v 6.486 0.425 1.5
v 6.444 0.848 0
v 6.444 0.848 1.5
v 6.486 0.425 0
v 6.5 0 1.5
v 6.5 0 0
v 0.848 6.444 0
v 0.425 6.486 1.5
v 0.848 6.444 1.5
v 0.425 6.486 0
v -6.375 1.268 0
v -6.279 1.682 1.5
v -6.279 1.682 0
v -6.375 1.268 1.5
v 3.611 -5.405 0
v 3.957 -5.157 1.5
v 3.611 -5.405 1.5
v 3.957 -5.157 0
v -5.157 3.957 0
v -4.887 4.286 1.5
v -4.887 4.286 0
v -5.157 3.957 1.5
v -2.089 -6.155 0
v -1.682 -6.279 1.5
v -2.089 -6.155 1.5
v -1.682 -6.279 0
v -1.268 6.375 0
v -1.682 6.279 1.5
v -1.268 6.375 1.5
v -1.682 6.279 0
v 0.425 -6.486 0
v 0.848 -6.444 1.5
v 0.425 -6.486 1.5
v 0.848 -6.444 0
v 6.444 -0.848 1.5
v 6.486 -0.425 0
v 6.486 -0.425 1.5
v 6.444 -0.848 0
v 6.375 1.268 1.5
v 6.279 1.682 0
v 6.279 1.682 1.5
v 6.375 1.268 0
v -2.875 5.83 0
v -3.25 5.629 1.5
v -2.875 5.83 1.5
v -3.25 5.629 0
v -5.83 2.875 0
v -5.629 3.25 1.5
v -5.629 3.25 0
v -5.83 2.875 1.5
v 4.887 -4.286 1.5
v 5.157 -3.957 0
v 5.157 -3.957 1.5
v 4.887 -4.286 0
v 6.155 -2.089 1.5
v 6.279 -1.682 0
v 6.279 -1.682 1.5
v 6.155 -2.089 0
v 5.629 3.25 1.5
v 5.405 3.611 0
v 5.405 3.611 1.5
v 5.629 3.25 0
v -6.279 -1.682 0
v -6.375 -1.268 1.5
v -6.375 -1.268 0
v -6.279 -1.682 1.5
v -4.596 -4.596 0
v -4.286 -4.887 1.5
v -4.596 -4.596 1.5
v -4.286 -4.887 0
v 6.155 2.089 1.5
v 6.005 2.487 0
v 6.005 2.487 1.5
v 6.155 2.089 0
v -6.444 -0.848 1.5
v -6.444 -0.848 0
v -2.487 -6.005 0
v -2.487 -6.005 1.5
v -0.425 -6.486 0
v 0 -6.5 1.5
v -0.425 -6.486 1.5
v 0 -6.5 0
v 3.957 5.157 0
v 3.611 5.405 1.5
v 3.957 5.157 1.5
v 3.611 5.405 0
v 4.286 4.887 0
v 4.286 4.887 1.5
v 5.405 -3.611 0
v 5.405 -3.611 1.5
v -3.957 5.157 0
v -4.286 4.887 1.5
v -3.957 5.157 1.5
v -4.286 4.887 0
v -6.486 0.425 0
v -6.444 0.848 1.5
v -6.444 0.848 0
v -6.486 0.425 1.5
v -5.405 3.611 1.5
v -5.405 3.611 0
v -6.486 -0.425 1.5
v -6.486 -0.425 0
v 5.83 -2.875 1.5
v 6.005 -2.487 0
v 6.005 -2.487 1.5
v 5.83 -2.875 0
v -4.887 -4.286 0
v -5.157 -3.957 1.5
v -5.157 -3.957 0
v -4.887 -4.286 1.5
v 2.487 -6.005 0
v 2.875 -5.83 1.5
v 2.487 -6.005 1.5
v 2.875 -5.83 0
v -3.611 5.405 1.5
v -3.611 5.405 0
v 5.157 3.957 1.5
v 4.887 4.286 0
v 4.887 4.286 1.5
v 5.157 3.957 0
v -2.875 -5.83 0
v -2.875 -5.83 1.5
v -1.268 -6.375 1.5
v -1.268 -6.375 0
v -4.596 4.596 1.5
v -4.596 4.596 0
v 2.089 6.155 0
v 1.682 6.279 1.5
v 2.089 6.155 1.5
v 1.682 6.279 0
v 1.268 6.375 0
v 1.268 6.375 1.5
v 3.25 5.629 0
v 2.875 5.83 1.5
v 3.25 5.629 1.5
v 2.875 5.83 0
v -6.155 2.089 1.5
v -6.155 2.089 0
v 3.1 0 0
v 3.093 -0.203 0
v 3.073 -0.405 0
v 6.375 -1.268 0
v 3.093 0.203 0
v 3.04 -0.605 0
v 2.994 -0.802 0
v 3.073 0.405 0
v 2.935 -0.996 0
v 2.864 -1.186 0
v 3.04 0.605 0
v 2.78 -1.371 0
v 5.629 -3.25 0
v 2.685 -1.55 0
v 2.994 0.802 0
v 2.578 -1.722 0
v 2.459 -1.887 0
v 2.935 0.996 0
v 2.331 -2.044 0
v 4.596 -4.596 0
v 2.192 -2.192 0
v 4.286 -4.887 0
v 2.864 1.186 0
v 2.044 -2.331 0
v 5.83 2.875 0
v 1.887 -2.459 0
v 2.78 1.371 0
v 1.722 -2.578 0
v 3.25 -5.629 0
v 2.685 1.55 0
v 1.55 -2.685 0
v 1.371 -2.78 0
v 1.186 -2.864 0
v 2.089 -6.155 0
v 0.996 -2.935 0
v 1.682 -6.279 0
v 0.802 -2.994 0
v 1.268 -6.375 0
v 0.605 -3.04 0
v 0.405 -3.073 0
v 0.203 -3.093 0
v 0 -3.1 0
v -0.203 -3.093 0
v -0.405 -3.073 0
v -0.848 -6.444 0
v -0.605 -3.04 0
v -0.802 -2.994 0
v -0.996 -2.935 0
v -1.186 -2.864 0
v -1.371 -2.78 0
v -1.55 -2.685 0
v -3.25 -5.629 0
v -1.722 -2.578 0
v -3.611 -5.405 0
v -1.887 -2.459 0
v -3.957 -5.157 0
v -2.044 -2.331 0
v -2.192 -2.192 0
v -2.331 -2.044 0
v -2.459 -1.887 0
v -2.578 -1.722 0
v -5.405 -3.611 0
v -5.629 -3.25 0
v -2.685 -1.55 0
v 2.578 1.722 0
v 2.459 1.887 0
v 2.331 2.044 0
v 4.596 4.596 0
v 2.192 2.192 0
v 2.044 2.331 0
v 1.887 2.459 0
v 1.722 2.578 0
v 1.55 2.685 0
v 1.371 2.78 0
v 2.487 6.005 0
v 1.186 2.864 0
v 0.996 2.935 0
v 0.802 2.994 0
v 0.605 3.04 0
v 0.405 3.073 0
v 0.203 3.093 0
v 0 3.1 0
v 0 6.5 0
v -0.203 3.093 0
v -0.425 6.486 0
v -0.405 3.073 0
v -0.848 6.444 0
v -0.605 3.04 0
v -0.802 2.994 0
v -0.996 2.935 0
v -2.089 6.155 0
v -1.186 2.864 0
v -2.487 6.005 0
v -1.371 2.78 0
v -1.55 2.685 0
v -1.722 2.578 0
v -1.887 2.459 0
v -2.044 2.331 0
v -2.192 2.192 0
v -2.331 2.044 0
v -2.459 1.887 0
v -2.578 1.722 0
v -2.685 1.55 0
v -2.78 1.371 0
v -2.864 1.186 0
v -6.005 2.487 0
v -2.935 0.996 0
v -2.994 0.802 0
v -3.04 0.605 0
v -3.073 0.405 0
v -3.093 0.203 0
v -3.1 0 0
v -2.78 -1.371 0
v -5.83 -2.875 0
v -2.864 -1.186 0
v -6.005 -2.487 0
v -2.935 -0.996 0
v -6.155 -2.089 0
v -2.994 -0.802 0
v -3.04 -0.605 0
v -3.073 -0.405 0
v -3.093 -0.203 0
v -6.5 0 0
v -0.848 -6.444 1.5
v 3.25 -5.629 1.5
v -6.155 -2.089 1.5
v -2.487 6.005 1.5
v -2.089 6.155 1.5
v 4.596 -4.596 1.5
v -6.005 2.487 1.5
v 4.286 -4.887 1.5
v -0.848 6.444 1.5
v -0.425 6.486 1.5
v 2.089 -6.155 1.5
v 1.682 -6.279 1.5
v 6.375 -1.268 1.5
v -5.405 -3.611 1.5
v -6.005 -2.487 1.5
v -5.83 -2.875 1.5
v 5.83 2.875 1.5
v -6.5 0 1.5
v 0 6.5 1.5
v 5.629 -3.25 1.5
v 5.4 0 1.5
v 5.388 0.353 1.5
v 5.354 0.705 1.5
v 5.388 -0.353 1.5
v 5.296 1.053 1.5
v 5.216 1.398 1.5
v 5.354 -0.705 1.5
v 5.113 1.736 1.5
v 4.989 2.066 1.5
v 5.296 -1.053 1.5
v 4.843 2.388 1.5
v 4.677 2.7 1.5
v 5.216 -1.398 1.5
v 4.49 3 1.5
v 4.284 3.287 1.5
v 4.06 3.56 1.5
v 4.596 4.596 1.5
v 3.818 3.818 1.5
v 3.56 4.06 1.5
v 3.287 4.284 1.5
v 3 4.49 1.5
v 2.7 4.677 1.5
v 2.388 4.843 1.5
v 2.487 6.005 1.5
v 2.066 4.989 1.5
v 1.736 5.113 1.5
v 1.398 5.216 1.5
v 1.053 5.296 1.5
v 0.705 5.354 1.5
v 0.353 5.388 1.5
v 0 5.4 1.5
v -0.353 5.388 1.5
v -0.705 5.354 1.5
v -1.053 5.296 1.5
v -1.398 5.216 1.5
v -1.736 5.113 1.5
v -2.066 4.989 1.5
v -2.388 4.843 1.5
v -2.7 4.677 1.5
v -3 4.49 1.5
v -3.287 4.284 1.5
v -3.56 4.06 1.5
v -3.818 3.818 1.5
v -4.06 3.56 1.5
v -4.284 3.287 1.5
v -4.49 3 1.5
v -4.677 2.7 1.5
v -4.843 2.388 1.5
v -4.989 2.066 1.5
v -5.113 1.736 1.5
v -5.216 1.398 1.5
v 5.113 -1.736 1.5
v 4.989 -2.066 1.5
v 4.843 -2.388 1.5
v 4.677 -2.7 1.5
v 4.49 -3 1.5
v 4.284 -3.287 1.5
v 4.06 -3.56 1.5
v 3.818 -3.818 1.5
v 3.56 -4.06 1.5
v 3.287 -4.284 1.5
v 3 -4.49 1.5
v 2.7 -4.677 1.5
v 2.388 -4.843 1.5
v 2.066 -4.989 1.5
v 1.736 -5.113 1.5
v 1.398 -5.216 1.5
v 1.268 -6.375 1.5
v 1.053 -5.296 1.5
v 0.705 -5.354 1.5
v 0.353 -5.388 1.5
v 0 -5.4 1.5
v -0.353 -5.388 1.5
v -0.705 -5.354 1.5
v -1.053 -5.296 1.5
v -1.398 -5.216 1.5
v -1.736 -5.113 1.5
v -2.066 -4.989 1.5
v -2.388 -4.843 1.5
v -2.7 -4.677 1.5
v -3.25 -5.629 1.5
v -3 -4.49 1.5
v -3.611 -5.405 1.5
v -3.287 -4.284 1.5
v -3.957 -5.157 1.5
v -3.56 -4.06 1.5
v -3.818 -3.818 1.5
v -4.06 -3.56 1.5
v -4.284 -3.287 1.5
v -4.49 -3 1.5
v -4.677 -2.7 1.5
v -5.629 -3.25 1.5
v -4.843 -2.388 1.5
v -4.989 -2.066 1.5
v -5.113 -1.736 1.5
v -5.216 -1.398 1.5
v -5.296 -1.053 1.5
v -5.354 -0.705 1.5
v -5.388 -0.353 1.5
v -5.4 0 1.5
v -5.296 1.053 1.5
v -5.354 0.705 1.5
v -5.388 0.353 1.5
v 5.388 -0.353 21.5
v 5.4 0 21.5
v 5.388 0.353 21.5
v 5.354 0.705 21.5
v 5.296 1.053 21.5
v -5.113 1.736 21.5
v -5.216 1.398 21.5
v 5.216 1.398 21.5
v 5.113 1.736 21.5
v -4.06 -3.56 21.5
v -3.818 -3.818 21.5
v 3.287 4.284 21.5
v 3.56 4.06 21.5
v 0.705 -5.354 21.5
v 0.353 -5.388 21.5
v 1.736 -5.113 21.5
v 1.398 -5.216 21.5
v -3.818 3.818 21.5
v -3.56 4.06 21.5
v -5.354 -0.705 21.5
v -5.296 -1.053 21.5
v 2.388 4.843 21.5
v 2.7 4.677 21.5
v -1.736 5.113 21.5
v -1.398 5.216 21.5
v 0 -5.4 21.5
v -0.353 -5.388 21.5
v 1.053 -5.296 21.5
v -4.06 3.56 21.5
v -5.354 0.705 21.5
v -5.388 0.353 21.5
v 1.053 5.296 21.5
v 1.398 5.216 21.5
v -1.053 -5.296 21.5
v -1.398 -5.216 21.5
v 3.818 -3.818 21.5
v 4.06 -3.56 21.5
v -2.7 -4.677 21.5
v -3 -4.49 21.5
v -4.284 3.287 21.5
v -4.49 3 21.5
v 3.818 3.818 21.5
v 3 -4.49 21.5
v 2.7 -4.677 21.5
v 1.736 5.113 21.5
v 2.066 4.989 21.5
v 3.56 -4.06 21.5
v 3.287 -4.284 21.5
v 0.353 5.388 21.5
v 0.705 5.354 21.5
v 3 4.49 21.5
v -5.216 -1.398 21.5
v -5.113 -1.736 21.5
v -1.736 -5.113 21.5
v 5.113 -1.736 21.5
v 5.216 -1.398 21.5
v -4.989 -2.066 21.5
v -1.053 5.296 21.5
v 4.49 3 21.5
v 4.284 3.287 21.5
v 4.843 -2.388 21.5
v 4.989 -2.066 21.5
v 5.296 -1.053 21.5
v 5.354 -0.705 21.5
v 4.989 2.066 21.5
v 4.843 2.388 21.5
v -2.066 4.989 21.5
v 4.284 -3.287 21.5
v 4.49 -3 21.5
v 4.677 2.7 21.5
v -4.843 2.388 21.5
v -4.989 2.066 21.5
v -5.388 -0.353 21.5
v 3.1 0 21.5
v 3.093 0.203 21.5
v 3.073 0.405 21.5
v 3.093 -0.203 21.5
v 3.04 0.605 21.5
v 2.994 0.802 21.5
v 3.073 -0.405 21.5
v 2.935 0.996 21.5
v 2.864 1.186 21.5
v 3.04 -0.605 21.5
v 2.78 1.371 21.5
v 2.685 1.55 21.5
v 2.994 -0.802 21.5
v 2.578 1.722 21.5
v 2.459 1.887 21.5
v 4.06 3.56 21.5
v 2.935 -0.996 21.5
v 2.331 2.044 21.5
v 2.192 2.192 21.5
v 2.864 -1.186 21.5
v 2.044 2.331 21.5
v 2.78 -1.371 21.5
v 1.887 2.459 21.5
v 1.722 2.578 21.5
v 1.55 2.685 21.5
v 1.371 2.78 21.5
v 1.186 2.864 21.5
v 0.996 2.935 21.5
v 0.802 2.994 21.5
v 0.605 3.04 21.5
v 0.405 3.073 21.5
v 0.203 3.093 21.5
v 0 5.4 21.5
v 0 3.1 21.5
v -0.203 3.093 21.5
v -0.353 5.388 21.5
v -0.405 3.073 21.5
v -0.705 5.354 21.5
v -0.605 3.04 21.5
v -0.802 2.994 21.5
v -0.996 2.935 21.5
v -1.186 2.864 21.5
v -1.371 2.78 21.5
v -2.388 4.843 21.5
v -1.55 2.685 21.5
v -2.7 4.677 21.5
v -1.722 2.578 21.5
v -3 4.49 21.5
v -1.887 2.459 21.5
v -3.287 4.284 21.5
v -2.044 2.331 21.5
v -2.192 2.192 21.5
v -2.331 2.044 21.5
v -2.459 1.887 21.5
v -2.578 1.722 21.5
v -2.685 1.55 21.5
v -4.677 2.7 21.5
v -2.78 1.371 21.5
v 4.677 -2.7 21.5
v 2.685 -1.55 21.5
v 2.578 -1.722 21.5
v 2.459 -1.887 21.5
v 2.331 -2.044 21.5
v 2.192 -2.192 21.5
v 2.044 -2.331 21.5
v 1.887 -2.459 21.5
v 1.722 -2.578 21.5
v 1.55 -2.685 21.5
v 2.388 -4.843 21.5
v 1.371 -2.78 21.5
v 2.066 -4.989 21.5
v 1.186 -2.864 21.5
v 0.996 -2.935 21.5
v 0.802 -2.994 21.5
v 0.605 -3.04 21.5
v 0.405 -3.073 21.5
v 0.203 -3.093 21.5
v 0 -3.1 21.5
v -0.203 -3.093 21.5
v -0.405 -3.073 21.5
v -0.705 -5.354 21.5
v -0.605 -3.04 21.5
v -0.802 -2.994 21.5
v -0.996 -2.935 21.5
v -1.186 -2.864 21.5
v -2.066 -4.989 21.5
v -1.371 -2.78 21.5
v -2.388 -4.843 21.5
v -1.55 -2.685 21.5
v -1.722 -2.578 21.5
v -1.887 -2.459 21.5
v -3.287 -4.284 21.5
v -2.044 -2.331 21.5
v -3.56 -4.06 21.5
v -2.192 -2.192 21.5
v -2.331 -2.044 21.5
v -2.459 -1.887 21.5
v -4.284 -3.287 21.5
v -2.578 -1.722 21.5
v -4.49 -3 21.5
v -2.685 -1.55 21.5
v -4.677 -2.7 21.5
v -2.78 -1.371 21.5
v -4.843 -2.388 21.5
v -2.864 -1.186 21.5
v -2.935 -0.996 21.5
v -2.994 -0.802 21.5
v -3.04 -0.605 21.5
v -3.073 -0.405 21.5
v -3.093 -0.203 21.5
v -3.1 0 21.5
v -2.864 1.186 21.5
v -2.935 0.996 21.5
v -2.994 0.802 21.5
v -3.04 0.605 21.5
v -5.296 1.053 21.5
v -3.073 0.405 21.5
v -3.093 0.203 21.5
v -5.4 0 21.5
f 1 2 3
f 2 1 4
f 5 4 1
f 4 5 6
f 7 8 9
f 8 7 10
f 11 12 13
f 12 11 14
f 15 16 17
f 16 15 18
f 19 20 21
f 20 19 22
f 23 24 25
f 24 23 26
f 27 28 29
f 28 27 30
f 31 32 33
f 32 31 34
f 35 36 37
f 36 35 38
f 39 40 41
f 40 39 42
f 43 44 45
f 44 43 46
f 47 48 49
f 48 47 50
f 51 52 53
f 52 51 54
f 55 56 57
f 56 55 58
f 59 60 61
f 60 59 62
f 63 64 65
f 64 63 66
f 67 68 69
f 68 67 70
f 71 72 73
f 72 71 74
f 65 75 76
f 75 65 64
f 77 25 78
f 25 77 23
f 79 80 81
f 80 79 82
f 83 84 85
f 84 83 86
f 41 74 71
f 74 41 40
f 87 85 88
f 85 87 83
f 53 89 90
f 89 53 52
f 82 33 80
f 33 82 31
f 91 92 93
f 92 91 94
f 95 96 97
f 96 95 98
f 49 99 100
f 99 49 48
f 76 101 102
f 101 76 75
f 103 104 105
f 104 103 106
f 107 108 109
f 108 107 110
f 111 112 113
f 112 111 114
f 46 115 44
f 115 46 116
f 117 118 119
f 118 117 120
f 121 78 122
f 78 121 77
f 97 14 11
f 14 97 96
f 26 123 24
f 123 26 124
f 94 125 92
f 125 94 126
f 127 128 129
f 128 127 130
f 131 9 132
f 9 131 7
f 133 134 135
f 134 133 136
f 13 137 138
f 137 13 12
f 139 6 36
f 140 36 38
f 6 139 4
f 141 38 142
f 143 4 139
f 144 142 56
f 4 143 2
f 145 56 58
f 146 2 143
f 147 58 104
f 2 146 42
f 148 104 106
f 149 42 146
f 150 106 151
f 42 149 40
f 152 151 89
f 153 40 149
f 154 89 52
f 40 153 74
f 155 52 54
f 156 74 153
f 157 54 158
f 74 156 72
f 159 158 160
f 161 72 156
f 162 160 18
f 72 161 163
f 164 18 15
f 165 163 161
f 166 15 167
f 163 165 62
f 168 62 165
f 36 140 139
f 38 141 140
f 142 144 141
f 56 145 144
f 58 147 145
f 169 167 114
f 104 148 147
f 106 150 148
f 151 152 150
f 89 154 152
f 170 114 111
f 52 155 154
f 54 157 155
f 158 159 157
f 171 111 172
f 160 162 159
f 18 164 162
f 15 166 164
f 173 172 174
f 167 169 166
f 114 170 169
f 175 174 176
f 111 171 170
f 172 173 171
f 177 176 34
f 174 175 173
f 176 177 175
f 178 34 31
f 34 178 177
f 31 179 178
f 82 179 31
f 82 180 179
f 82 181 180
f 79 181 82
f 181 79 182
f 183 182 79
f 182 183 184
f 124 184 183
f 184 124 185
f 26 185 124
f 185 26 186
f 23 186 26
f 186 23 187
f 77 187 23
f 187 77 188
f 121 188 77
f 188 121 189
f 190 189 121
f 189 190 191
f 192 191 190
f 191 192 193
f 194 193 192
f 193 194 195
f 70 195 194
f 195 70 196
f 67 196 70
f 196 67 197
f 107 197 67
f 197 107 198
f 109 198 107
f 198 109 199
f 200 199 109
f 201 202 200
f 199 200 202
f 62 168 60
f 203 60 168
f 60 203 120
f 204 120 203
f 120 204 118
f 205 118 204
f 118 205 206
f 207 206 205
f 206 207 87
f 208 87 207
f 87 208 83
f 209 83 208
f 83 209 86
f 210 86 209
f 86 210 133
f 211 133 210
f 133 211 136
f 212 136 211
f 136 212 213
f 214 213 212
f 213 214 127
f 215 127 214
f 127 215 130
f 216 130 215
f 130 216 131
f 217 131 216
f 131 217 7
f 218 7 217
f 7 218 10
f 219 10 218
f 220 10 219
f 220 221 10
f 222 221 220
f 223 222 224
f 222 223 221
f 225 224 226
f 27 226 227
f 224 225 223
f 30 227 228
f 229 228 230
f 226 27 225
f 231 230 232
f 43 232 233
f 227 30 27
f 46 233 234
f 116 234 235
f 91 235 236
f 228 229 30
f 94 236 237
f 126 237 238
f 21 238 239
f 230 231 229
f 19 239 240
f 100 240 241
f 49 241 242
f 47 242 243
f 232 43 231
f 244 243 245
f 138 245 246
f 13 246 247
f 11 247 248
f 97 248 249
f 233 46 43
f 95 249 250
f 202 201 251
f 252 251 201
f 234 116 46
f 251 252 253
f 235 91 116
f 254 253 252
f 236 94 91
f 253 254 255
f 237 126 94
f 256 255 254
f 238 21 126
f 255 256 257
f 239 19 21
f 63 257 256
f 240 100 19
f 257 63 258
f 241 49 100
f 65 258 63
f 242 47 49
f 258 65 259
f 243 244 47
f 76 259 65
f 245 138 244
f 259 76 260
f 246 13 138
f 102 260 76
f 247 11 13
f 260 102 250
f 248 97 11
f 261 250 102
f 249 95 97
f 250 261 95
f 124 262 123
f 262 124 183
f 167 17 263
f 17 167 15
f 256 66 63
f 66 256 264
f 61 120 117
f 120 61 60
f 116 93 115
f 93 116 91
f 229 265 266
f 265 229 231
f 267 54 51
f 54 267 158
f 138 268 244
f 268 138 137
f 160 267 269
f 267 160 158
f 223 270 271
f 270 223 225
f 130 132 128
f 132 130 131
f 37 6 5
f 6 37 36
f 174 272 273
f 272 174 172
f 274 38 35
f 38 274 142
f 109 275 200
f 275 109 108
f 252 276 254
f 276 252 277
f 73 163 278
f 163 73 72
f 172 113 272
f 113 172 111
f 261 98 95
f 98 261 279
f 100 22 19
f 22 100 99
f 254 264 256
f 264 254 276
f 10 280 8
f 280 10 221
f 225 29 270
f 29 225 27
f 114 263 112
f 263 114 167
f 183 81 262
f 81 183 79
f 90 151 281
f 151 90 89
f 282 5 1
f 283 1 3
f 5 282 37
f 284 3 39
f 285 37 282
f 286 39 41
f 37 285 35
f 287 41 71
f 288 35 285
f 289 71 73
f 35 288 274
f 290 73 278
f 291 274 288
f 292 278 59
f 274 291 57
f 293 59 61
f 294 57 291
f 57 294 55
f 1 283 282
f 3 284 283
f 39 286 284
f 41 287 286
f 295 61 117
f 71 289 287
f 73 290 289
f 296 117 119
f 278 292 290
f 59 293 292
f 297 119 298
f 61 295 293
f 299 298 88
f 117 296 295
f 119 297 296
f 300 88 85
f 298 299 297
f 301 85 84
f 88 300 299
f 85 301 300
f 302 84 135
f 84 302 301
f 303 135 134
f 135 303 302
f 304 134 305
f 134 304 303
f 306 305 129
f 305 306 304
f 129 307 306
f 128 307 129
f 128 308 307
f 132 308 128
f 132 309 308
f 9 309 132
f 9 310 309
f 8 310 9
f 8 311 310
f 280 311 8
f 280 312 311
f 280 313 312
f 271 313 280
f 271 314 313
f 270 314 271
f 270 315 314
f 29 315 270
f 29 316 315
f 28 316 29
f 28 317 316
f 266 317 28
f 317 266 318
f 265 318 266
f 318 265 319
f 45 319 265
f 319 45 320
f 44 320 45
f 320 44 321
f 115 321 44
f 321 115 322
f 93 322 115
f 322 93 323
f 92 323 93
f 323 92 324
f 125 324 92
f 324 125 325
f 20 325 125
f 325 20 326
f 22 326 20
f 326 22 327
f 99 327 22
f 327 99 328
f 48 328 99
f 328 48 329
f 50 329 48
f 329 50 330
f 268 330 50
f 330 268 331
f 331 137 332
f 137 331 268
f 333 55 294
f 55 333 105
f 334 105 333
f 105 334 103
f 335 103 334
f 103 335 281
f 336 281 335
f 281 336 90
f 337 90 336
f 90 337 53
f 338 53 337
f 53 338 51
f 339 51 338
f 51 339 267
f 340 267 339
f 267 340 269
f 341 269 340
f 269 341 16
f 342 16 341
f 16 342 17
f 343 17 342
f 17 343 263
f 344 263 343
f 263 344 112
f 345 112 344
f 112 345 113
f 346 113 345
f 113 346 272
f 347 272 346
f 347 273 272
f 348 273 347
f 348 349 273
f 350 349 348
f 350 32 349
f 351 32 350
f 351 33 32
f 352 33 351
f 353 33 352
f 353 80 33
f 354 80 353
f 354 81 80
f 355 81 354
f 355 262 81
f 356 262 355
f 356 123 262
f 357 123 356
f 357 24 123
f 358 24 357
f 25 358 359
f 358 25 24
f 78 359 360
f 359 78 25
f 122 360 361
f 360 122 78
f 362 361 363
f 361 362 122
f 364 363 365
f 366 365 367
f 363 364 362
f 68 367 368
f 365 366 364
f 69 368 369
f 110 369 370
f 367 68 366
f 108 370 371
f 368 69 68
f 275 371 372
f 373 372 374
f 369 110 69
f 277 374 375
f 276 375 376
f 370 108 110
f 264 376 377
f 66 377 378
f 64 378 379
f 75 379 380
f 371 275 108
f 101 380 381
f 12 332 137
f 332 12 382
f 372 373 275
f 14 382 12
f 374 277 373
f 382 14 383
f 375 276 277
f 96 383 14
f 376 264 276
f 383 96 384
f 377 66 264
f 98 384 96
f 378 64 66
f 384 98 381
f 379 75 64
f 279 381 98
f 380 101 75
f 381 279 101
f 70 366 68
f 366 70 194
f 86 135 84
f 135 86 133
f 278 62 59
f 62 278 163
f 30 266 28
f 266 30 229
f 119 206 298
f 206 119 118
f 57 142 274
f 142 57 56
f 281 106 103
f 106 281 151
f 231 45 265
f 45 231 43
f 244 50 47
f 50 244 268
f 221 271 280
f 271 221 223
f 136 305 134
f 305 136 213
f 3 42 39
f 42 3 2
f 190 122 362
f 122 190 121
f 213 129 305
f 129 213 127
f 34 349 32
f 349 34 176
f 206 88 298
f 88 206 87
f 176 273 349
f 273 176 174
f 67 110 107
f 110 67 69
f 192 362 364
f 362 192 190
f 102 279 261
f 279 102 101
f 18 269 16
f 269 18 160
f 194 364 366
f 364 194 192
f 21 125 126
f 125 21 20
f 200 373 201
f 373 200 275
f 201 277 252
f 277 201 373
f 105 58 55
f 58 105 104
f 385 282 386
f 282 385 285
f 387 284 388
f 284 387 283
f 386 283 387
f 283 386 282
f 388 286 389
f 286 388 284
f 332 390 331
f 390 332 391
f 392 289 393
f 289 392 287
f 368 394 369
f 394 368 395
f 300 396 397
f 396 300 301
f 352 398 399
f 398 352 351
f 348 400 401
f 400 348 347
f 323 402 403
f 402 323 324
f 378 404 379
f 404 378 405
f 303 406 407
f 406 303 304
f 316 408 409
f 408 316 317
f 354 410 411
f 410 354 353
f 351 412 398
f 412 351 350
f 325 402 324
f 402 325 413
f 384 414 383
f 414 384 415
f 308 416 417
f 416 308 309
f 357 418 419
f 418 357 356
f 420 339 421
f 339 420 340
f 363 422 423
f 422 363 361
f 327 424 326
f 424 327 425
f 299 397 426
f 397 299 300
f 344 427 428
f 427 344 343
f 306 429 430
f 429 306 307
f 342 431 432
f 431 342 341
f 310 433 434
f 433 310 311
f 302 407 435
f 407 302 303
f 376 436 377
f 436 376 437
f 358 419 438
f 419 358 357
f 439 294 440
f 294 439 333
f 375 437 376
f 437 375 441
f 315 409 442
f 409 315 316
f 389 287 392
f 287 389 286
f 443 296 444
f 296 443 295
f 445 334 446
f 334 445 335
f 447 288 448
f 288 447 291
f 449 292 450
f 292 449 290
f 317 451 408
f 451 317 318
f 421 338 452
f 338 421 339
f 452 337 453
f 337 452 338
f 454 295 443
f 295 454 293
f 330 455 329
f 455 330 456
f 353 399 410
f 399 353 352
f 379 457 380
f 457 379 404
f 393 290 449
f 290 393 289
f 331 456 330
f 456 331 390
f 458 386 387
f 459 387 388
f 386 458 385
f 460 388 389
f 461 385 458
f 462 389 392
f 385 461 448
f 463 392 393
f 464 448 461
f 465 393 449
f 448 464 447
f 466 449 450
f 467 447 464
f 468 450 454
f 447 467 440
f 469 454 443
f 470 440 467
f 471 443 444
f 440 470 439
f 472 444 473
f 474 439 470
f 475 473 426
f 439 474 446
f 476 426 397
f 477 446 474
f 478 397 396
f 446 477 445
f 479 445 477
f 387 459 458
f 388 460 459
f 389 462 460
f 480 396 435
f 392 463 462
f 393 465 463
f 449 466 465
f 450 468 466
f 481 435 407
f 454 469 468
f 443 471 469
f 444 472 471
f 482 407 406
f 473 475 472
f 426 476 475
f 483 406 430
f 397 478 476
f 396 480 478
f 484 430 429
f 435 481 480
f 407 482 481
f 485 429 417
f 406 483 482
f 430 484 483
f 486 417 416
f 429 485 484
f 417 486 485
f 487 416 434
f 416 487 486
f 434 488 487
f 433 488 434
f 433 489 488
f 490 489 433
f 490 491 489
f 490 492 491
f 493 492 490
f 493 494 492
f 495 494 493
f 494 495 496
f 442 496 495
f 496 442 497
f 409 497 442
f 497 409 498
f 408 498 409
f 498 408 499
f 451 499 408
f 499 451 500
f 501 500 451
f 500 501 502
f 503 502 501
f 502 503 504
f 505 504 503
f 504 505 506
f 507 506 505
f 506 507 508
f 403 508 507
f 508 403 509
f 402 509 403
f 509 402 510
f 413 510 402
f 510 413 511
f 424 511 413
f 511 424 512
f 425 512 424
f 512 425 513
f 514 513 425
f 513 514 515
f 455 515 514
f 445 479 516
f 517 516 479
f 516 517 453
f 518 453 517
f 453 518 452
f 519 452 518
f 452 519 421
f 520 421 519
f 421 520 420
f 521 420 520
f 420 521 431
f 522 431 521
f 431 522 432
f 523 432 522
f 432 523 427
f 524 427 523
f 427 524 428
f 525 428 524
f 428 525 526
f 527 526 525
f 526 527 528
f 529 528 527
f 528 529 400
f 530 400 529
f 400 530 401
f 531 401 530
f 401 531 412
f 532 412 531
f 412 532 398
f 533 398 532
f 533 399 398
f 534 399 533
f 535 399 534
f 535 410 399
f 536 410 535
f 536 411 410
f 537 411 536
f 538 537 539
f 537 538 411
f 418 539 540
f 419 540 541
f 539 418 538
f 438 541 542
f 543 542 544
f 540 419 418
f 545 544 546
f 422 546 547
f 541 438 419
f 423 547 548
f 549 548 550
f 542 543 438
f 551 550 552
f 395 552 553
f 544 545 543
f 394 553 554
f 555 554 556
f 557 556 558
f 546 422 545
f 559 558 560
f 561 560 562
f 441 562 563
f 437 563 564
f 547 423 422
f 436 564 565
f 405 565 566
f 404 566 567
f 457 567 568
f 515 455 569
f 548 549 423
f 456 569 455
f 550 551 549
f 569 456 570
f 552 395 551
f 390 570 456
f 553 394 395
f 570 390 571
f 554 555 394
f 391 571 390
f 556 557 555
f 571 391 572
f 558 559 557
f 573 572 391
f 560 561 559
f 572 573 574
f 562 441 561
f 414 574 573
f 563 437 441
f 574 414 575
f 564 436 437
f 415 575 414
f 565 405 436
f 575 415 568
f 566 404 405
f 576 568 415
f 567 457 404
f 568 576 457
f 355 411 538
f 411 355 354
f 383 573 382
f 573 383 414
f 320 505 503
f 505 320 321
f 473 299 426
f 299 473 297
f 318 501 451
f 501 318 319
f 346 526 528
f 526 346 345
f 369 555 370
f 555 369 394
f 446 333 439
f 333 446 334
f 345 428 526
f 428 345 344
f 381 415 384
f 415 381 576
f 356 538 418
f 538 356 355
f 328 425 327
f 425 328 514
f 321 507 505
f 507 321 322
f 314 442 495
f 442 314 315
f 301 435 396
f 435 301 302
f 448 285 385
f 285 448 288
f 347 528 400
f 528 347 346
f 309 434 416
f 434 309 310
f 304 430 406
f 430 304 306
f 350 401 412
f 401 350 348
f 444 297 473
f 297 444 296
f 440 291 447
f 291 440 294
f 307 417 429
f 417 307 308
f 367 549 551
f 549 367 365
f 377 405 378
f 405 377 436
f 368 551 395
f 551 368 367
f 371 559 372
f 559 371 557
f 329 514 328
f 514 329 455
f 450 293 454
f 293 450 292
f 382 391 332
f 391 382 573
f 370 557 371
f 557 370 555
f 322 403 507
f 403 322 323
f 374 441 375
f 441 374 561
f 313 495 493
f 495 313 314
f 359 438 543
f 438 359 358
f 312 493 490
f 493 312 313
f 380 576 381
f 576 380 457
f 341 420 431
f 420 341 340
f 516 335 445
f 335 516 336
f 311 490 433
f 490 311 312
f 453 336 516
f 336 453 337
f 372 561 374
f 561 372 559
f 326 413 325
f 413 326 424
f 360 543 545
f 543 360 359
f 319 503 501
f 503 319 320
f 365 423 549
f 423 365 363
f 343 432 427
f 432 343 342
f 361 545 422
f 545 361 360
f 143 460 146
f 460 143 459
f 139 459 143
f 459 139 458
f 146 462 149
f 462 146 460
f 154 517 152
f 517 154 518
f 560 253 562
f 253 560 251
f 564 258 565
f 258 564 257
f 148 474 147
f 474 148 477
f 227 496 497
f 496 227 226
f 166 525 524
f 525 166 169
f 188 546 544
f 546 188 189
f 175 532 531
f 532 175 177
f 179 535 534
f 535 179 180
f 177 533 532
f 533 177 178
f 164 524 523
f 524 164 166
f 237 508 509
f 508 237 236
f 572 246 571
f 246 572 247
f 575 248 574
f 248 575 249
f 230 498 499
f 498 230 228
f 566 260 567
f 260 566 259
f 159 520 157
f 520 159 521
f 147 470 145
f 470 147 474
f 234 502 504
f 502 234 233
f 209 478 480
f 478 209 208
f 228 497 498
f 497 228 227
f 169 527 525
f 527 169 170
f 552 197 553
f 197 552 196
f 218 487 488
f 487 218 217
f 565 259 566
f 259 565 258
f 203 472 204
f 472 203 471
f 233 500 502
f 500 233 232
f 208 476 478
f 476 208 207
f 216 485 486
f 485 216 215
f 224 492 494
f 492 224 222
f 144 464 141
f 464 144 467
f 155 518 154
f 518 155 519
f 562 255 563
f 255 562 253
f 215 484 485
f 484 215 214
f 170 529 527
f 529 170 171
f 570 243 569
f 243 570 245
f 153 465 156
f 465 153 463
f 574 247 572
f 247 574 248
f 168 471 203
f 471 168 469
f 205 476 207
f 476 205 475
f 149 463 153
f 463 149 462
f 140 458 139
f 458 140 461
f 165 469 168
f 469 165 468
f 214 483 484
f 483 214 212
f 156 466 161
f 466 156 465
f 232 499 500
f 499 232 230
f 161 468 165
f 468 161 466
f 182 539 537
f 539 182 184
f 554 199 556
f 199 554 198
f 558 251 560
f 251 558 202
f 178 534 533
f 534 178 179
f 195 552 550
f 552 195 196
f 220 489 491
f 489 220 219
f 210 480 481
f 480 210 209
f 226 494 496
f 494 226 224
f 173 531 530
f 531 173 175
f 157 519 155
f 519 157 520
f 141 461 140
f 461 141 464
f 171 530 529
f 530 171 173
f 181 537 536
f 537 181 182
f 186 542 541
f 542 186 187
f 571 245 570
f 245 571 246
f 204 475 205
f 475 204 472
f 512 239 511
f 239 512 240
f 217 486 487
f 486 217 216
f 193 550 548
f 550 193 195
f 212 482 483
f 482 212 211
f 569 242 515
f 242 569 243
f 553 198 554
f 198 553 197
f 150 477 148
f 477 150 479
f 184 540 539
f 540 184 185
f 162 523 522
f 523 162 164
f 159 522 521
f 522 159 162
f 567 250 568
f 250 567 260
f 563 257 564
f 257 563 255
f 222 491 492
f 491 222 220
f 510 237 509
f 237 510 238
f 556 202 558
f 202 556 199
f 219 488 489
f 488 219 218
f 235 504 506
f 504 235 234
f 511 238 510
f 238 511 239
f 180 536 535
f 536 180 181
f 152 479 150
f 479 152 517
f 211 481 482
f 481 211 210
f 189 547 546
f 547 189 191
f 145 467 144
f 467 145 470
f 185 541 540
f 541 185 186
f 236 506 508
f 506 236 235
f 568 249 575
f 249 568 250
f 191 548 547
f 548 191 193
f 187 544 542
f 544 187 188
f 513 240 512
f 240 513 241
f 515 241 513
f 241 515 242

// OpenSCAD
// Adapter sleeve: lets a 0.2 mL PCR tube sit in a rack hole made for 1.5 mL tubes
// Print orientation: upside down, collar on the bed (z = 0), sleeve rising to z = 21.5

$fn = 96;

// ---- Dimensions (mm) ----
collar_d      = 13;    // collar outer diameter
collar_h      = 1.5;   // collar thickness (z = 0 to 1.5)
sleeve_od     = 10.8;  // sleeve body outer diameter
total_h       = 21.5;  // overall height (top of sleeve)
bore_d        = 6.2;   // straight through-bore diameter
eps           = 0.5;   // cutter overshoot past faces

difference() {
    union() {
        // Collar lying on the bed
        cylinder(d = collar_d, h = collar_h);
        // Sleeve body rising from the collar (overlaps collar slightly for a clean union)
        translate([0, 0, collar_h - 0.01])
            cylinder(d = sleeve_od, h = total_h - collar_h + 0.01);
    }
    // Straight bore through the full height, open at both ends
    translate([0, 0, -eps])
        cylinder(d = bore_d, h = total_h + 2 * eps);
}
